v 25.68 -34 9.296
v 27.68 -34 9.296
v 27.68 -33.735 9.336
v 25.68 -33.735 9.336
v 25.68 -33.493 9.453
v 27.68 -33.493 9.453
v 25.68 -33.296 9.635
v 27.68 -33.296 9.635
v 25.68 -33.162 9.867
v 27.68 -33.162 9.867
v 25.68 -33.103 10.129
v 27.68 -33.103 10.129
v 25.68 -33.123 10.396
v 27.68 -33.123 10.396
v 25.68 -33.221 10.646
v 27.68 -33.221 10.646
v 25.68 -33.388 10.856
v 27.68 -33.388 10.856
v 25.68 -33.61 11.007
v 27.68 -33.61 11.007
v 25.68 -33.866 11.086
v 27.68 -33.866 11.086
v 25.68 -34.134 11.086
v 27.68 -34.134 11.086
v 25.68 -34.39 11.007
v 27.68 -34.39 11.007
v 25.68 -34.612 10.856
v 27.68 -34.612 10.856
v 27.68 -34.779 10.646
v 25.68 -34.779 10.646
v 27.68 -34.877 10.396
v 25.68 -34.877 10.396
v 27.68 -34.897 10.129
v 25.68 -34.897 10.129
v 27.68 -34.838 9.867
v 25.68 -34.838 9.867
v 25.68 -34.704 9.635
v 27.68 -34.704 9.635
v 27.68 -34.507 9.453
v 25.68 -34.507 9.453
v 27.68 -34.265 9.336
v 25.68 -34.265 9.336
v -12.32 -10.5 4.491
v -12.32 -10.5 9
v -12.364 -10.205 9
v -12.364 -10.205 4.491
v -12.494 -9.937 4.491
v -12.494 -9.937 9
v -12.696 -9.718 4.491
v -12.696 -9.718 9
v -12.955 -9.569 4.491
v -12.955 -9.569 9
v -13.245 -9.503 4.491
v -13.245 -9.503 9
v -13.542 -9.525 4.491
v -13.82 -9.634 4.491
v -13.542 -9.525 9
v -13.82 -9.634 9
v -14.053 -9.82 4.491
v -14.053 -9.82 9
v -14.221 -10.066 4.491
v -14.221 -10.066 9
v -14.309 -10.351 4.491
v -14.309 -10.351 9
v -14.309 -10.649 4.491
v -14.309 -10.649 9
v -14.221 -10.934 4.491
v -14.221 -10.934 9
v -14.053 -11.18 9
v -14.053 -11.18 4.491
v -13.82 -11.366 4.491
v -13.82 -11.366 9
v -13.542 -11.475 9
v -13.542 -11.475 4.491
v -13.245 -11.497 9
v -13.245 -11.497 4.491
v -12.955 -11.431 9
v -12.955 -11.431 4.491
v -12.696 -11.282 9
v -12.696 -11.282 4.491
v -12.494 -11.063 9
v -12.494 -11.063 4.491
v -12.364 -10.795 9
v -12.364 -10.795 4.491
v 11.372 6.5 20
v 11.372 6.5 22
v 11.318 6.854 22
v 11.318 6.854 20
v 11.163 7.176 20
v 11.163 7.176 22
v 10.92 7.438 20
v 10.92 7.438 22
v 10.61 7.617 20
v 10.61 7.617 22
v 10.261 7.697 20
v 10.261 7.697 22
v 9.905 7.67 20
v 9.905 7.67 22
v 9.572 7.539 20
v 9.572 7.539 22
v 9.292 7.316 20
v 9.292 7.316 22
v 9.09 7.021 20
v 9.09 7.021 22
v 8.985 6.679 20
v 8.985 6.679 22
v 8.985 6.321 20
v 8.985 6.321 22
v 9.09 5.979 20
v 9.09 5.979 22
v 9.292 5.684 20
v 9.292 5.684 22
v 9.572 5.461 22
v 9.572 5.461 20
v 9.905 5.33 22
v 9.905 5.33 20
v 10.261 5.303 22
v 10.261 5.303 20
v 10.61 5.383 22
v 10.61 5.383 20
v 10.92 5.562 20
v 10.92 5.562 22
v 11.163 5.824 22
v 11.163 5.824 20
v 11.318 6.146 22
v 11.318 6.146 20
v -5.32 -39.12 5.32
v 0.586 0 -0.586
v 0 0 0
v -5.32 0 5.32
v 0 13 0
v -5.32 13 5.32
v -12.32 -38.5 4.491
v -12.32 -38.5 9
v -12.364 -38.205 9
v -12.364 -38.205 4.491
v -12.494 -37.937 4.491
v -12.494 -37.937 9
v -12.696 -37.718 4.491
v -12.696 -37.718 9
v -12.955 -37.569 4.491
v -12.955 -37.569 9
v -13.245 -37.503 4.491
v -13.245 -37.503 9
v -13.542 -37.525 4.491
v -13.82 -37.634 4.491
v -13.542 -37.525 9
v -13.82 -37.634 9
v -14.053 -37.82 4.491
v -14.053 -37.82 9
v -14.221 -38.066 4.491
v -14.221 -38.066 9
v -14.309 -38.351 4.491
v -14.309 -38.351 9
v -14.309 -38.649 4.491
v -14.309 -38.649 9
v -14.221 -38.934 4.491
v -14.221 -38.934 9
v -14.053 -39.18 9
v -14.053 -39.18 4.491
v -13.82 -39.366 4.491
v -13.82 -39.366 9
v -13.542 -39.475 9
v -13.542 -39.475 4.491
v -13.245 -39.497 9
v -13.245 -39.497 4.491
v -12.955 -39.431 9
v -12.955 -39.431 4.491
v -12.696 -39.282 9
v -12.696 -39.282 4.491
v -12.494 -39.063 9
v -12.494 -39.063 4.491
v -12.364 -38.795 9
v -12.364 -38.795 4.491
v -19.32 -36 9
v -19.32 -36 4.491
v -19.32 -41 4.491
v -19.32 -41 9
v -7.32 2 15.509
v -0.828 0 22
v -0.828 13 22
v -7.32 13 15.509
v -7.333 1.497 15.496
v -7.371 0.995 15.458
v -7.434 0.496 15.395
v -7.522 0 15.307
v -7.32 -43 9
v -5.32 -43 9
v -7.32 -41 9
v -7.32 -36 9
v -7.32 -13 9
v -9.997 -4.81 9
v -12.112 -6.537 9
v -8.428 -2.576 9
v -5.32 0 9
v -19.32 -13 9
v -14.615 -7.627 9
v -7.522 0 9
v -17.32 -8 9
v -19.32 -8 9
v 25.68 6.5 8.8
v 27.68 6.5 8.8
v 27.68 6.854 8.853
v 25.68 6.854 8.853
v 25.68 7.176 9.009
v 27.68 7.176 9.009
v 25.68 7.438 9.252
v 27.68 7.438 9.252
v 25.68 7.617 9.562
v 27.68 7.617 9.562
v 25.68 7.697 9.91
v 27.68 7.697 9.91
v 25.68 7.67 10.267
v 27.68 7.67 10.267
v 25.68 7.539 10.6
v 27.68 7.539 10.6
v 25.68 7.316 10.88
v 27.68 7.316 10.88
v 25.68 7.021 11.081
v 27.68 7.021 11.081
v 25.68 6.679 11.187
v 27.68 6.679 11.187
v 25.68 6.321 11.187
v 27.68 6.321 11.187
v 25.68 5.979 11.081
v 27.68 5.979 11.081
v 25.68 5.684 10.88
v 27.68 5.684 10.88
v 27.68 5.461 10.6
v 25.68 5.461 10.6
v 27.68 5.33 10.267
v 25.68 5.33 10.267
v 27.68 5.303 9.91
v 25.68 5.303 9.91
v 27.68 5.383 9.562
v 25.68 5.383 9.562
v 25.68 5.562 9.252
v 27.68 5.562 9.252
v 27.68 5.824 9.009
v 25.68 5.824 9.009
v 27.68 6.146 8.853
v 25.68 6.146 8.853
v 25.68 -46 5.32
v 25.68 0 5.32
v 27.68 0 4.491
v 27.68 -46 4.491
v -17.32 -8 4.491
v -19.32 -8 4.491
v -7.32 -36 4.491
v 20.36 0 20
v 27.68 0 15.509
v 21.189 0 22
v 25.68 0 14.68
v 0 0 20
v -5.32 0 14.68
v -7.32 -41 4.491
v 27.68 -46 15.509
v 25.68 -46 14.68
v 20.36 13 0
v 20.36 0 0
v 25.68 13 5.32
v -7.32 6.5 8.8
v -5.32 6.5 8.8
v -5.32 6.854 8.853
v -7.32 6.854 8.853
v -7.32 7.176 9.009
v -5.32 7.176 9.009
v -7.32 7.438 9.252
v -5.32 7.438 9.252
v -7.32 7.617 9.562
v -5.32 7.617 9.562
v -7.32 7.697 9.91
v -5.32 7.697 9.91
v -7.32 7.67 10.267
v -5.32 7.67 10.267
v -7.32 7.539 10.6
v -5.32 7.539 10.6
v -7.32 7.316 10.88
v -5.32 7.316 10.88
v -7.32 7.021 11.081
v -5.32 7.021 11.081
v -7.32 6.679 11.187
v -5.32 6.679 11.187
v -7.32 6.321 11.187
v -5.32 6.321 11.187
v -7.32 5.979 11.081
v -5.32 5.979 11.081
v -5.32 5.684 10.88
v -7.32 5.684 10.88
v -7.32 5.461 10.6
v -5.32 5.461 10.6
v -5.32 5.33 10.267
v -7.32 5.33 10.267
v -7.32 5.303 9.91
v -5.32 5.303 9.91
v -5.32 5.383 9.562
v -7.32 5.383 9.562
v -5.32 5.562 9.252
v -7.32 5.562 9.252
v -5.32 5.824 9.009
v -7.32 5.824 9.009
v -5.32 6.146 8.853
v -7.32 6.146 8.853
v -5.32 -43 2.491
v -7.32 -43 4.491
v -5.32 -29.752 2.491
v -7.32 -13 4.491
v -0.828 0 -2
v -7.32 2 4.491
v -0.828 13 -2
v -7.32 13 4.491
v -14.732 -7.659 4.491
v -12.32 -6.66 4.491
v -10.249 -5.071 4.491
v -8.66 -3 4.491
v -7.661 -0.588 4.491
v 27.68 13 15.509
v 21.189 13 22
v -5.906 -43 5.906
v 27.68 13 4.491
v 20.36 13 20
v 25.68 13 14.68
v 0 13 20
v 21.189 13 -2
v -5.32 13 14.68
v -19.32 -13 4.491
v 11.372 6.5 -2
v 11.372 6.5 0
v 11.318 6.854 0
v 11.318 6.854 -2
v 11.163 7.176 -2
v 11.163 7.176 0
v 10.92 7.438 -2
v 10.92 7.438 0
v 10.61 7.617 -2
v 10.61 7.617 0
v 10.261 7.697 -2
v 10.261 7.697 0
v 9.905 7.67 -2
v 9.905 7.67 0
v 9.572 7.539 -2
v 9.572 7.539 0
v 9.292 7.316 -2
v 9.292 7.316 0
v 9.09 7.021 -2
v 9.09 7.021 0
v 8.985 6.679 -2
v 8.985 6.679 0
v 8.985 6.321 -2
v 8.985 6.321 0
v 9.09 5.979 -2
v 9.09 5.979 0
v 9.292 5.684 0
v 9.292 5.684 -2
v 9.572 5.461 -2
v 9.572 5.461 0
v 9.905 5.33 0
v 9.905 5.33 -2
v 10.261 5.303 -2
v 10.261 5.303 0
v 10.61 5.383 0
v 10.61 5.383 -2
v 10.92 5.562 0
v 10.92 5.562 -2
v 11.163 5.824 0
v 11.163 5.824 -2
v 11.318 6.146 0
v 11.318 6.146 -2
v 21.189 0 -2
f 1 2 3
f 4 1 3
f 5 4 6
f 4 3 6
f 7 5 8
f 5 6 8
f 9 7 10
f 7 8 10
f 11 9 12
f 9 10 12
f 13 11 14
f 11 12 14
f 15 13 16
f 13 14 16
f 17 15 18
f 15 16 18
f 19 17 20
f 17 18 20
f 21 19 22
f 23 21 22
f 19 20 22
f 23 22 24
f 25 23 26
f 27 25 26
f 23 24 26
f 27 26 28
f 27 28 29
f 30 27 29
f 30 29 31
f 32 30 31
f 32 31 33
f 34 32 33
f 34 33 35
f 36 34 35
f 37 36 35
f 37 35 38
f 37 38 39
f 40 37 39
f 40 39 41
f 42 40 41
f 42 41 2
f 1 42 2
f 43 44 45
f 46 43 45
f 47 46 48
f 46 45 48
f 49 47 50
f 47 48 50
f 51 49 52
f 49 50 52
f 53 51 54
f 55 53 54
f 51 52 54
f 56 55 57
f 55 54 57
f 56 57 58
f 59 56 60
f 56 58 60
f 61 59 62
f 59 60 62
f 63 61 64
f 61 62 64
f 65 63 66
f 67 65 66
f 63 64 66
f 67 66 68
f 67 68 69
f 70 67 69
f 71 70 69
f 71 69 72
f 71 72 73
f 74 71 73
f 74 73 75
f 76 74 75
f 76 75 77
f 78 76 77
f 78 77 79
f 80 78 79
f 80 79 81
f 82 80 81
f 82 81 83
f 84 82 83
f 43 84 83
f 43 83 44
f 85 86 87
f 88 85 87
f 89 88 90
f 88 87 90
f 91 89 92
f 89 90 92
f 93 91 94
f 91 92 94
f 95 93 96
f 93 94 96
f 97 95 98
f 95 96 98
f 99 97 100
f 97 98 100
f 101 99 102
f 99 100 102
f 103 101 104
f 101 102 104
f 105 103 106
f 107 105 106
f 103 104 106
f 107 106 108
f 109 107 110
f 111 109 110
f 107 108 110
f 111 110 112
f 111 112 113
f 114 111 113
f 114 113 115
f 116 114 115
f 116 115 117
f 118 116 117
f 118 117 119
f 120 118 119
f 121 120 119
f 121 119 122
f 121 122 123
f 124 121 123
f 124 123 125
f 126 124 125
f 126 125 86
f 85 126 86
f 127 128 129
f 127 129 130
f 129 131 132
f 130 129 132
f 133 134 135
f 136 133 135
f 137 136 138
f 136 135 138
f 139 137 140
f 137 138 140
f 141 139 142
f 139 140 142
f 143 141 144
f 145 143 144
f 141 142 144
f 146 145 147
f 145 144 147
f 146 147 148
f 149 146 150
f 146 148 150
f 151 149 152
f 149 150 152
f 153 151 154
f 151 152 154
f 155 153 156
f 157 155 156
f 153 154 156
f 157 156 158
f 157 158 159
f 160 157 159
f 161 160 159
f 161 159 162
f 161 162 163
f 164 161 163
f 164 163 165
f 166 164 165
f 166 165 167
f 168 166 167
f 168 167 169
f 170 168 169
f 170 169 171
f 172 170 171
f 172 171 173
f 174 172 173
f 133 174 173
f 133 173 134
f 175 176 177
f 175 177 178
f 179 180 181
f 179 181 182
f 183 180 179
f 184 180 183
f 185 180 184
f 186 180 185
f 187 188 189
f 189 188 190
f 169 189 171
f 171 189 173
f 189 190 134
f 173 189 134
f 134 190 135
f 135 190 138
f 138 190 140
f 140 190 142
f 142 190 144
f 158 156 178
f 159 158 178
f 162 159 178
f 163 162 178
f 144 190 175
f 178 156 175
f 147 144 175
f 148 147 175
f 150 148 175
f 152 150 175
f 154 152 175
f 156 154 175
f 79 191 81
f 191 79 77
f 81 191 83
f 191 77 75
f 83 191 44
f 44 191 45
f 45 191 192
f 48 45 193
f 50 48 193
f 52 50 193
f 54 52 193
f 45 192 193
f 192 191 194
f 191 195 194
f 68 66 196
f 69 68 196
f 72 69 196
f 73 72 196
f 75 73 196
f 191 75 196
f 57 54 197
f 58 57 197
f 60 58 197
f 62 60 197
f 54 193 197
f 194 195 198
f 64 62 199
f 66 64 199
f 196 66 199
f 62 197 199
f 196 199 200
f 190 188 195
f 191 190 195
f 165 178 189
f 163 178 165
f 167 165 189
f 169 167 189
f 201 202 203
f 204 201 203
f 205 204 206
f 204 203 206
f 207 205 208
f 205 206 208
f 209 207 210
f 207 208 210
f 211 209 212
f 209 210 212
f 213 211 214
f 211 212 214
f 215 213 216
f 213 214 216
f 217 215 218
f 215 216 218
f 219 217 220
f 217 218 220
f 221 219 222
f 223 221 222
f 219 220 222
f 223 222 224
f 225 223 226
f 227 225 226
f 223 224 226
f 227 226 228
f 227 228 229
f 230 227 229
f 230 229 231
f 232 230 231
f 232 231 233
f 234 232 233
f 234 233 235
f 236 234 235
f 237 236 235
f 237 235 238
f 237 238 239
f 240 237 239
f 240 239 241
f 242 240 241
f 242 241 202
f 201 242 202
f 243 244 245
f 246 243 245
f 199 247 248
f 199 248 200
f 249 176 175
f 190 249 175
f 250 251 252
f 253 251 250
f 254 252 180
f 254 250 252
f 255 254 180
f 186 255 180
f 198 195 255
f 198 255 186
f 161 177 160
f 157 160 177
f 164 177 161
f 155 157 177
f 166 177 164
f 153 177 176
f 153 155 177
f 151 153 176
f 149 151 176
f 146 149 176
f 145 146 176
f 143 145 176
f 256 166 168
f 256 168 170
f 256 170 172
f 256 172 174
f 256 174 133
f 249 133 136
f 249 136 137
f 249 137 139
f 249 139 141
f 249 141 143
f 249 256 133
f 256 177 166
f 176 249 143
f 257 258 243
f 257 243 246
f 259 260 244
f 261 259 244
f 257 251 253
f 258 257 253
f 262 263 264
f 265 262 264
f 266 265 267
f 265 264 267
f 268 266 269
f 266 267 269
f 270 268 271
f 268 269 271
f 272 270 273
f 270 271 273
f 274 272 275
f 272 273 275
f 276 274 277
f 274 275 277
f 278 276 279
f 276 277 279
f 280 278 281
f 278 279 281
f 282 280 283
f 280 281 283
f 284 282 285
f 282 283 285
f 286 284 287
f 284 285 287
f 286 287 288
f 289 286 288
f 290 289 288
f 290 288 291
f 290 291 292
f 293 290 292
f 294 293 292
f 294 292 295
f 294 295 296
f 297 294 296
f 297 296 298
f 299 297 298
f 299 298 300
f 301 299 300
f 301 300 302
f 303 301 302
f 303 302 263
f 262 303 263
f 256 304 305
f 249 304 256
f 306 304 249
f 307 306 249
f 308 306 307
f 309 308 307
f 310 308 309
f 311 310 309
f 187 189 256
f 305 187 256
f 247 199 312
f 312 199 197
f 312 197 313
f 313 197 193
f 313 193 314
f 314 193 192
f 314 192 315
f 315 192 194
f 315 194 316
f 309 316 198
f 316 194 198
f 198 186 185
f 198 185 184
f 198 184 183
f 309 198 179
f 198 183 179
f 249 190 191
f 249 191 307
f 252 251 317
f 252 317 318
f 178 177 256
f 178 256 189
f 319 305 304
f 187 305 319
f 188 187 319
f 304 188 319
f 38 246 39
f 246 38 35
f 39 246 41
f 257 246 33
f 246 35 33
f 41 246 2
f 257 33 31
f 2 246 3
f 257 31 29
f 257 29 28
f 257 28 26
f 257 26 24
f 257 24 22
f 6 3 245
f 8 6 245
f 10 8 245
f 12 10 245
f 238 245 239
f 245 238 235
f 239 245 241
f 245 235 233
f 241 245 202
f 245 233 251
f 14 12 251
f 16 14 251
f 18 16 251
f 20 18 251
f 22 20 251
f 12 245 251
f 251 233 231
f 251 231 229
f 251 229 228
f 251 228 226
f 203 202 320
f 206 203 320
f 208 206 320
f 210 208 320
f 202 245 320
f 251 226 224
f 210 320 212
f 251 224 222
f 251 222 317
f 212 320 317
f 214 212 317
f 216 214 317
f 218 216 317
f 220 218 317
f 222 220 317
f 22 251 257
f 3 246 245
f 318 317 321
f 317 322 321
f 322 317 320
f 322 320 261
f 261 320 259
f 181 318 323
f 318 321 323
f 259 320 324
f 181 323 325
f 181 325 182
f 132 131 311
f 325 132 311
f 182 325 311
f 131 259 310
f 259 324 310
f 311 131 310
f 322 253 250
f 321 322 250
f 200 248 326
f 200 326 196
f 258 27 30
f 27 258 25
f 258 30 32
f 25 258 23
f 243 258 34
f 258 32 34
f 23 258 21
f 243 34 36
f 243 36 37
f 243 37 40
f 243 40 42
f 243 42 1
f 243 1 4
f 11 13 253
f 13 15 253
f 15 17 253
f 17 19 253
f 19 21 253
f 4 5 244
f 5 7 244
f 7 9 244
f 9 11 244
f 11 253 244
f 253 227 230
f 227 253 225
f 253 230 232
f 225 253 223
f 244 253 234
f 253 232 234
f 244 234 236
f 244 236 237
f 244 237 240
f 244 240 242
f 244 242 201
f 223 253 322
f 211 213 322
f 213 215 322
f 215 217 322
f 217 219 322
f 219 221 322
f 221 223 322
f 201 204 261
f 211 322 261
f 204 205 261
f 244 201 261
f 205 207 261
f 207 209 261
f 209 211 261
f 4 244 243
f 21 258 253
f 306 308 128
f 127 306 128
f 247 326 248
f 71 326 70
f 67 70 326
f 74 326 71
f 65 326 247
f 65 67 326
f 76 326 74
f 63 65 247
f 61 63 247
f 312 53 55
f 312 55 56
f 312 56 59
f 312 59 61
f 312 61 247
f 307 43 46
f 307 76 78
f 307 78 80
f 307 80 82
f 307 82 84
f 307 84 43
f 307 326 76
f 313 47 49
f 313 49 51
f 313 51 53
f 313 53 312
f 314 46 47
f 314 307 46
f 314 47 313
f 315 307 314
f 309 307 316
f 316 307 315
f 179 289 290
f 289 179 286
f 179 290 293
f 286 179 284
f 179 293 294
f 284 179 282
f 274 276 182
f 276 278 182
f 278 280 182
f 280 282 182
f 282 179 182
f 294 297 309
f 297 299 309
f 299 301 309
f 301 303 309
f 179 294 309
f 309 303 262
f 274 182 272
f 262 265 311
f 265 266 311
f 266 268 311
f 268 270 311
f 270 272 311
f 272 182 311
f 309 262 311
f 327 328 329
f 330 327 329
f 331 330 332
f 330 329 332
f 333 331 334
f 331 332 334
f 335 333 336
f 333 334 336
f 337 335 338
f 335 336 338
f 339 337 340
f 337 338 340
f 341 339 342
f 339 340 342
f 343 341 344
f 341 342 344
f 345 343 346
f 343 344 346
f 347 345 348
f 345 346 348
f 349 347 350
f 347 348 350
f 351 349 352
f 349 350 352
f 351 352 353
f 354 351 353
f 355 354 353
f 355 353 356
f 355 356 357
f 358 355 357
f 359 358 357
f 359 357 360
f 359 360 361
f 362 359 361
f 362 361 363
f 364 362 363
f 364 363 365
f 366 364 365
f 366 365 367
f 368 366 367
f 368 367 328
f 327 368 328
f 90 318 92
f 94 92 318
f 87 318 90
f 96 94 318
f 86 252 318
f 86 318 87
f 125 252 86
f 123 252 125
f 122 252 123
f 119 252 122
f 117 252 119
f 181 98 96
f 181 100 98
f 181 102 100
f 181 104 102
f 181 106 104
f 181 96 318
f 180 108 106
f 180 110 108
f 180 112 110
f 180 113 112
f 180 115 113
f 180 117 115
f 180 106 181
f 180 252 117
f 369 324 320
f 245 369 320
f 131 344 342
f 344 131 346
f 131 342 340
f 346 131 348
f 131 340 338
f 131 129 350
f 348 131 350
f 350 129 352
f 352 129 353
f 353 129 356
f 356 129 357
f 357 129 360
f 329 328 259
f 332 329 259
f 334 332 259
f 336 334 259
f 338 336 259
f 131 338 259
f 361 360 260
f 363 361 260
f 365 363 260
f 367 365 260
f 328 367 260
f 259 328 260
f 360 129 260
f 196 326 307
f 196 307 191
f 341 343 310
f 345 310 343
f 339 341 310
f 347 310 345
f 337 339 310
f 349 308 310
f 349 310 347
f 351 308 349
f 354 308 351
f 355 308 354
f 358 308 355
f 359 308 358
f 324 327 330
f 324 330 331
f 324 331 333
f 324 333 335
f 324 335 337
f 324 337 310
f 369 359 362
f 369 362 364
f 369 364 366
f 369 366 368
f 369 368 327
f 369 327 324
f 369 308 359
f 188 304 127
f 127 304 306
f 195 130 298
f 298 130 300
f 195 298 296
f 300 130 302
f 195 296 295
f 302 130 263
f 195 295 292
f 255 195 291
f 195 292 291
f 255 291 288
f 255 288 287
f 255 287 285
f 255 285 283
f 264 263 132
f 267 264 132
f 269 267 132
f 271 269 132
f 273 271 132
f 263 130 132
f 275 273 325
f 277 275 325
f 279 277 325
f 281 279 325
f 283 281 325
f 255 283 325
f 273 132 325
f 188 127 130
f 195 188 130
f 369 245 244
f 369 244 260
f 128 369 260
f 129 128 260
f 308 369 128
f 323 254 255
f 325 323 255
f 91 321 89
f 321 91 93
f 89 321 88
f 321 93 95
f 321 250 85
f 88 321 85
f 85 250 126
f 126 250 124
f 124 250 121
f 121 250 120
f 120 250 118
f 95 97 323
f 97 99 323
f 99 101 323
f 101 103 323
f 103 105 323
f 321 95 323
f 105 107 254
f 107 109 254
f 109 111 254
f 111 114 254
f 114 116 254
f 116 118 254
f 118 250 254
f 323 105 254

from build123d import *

# Parameters (mm, degrees)
BOSS_EXTRUDE1_DEPTH = 13
BOSS_EXTRUDE2_DEPTH = 46
SKETCH8_R           = 0.9
CUT_EXTRUDE1_DEPTH  = 10
SKETCH9_R           = 1.2
CUT_EXTRUDE2_DEPTH  = 40
SKETCH10_R          = 1.2
CUT_EXTRUDE3_DEPTH  = 50
BOSS_EXTRUDE3_DEPTH = 43
SKETCH12_W          = 4.508561795
SKETCH12_H          = 5
BOSS_EXTRUDE4_DEPTH = 12
SKETCH14_R          = 1
CUT_EXTRUDE4_DEPTH  = 30
BOSS_EXTRUDE5_DEPTH = 2
FILLET3_R           = 10
BOSS_EXTRUDE6_DEPTH = 46
SKETCH8_2_R         = 0.9
CUT_EXTRUDE5_DEPTH  = 30


with BuildPart() as part:
    # Sketch1 → Boss-Extrude1 (new body)
    with BuildSketch(Plane(origin=(0, 0, 0), x_dir=(1, 0, 0), z_dir=(0, 1, 0))):
        Polygon((-7.31986533, -4.491438205), (-0.828427125, 2), (21.188696525, 2), (27.68013467, -4.491438145), (27.68013467, -15.508561795), (21.188696464, -22), (-0.828427125, -22), (-7.31986533, -15.508561795), align=None)
        Polygon((0, 0), (20.3602694, 0), (25.68013467, -5.31986527), (25.68013467, -14.68013467), (20.36026934, -20), (0, -20), (-5.31986533, -14.68013467), (-5.31986533, -5.31986533), align=None, mode=Mode.SUBTRACT)
    extrude(amount=BOSS_EXTRUDE1_DEPTH)

    # Sketch7 → Boss-Extrude2 (add)
    with BuildSketch(Plane.XZ):
        with BuildLine():
            ThreePointArc((27.68013467, 12.696190421), (26.68013467, 13.696190421), (25.68013467, 12.696190421))
            Line((25.68013467, 12.696190421), (25.68013467, 7.303809579))
            ThreePointArc((25.68013467, 7.303809579), (26.68013467, 6.303809579), (27.68013467, 7.303809579))
            Line((27.68013467, 7.303809579), (27.68013467, 12.696190421))
        make_face()
    extrude(amount=BOSS_EXTRUDE2_DEPTH)

    # Sketch8 → Cut-Extrude1 (cut)
    with BuildSketch(Plane(origin=(27.68013467, 0, 0), x_dir=(0, 0, -1), z_dir=(1, 0, 0))):
        with Locations((-10.196190421, -34)):
            Circle(SKETCH8_R)
    extrude(amount=-CUT_EXTRUDE1_DEPTH, mode=Mode.SUBTRACT)

    # Sketch9 → Cut-Extrude2 (cut)
    with BuildSketch(Plane.XY.offset(22)):
        with Locations((10.171572875, 6.5)):
            Circle(SKETCH9_R)
    extrude(amount=-CUT_EXTRUDE2_DEPTH, mode=Mode.SUBTRACT)

    # Sketch10 → Cut-Extrude3 (cut)
    with BuildSketch(Plane(origin=(27.68013467, 0, 0), x_dir=(0, 0, -1), z_dir=(1, 0, 0))):
        with Locations((-10, 6.5)):
            Circle(SKETCH10_R)
    extrude(amount=-CUT_EXTRUDE3_DEPTH, mode=Mode.SUBTRACT)

    # Sketch11 → Boss-Extrude3 (add)
    with BuildSketch(Plane.XZ):
        Polygon((-5.31986533, 9), (-7.31986533, 9), (-7.31986533, 4.491438205), (-5.31986533, 2.491438205), align=None)
    extrude(amount=BOSS_EXTRUDE3_DEPTH)

    # Sketch12 → Boss-Extrude4 (add)
    with BuildSketch(Plane.ZY.offset(7.31986533)):
        with Locations((6.745719103, -10.5)):
            Rectangle(SKETCH12_W, SKETCH12_H)
        with Locations((6.745719103, -38.5)):
            Rectangle(SKETCH12_W, SKETCH12_H)
    extrude(amount=BOSS_EXTRUDE4_DEPTH)

    # Sketch14 → Cut-Extrude4 (cut)
    with BuildSketch(Plane.XY.offset(9)):
        with Locations((-13.31986532, -10.5)):
            Circle(SKETCH14_R)
        with Locations((-13.31986532, -38.5)):
            Circle(SKETCH14_R)
    extrude(amount=-CUT_EXTRUDE4_DEPTH, mode=Mode.SUBTRACT)

    # Sketch17 → Boss-Extrude5 (add)
    with BuildSketch(Plane(origin=(-1.414213562, 0, -1.414213562), x_dir=(-0.7071067811865714, 0, 0.7071067811865236), z_dir=(-0.7071067811865236, 0, -0.7071067811865714))):
        Polygon((-0.828427125, 0), (8.351852825, -43), (8.351852825, 0), align=None)
    extrude(amount=-BOSS_EXTRUDE5_DEPTH)

    # Fillet3
    fillet3_edges = [part.edges().sort_by_distance(p)[0] for p in [
        (-7.31986533, -8, 6.745719103),
    ]]
    fillet(fillet3_edges, radius=FILLET3_R)

    # Sketch18 → Boss-Extrude6 (add)
    with BuildSketch(Plane.XZ):
        Polygon((27.68013467, 15.508561795), (25.68013467, 14.68013467), (25.68013467, 5.31986527), (27.68013467, 4.491438145), align=None)
    extrude(amount=BOSS_EXTRUDE6_DEPTH)

    # Sketch8<2> → Cut-Extrude5 (cut)
    with BuildSketch(Plane(origin=(27.68013467, 0, 0), x_dir=(0, 0, -1), z_dir=(1, 0, 0))):
        with Locations((-10.196190421, -34)):
            Circle(SKETCH8_2_R)
    extrude(amount=-CUT_EXTRUDE5_DEPTH, mode=Mode.SUBTRACT)


solid = part.part
